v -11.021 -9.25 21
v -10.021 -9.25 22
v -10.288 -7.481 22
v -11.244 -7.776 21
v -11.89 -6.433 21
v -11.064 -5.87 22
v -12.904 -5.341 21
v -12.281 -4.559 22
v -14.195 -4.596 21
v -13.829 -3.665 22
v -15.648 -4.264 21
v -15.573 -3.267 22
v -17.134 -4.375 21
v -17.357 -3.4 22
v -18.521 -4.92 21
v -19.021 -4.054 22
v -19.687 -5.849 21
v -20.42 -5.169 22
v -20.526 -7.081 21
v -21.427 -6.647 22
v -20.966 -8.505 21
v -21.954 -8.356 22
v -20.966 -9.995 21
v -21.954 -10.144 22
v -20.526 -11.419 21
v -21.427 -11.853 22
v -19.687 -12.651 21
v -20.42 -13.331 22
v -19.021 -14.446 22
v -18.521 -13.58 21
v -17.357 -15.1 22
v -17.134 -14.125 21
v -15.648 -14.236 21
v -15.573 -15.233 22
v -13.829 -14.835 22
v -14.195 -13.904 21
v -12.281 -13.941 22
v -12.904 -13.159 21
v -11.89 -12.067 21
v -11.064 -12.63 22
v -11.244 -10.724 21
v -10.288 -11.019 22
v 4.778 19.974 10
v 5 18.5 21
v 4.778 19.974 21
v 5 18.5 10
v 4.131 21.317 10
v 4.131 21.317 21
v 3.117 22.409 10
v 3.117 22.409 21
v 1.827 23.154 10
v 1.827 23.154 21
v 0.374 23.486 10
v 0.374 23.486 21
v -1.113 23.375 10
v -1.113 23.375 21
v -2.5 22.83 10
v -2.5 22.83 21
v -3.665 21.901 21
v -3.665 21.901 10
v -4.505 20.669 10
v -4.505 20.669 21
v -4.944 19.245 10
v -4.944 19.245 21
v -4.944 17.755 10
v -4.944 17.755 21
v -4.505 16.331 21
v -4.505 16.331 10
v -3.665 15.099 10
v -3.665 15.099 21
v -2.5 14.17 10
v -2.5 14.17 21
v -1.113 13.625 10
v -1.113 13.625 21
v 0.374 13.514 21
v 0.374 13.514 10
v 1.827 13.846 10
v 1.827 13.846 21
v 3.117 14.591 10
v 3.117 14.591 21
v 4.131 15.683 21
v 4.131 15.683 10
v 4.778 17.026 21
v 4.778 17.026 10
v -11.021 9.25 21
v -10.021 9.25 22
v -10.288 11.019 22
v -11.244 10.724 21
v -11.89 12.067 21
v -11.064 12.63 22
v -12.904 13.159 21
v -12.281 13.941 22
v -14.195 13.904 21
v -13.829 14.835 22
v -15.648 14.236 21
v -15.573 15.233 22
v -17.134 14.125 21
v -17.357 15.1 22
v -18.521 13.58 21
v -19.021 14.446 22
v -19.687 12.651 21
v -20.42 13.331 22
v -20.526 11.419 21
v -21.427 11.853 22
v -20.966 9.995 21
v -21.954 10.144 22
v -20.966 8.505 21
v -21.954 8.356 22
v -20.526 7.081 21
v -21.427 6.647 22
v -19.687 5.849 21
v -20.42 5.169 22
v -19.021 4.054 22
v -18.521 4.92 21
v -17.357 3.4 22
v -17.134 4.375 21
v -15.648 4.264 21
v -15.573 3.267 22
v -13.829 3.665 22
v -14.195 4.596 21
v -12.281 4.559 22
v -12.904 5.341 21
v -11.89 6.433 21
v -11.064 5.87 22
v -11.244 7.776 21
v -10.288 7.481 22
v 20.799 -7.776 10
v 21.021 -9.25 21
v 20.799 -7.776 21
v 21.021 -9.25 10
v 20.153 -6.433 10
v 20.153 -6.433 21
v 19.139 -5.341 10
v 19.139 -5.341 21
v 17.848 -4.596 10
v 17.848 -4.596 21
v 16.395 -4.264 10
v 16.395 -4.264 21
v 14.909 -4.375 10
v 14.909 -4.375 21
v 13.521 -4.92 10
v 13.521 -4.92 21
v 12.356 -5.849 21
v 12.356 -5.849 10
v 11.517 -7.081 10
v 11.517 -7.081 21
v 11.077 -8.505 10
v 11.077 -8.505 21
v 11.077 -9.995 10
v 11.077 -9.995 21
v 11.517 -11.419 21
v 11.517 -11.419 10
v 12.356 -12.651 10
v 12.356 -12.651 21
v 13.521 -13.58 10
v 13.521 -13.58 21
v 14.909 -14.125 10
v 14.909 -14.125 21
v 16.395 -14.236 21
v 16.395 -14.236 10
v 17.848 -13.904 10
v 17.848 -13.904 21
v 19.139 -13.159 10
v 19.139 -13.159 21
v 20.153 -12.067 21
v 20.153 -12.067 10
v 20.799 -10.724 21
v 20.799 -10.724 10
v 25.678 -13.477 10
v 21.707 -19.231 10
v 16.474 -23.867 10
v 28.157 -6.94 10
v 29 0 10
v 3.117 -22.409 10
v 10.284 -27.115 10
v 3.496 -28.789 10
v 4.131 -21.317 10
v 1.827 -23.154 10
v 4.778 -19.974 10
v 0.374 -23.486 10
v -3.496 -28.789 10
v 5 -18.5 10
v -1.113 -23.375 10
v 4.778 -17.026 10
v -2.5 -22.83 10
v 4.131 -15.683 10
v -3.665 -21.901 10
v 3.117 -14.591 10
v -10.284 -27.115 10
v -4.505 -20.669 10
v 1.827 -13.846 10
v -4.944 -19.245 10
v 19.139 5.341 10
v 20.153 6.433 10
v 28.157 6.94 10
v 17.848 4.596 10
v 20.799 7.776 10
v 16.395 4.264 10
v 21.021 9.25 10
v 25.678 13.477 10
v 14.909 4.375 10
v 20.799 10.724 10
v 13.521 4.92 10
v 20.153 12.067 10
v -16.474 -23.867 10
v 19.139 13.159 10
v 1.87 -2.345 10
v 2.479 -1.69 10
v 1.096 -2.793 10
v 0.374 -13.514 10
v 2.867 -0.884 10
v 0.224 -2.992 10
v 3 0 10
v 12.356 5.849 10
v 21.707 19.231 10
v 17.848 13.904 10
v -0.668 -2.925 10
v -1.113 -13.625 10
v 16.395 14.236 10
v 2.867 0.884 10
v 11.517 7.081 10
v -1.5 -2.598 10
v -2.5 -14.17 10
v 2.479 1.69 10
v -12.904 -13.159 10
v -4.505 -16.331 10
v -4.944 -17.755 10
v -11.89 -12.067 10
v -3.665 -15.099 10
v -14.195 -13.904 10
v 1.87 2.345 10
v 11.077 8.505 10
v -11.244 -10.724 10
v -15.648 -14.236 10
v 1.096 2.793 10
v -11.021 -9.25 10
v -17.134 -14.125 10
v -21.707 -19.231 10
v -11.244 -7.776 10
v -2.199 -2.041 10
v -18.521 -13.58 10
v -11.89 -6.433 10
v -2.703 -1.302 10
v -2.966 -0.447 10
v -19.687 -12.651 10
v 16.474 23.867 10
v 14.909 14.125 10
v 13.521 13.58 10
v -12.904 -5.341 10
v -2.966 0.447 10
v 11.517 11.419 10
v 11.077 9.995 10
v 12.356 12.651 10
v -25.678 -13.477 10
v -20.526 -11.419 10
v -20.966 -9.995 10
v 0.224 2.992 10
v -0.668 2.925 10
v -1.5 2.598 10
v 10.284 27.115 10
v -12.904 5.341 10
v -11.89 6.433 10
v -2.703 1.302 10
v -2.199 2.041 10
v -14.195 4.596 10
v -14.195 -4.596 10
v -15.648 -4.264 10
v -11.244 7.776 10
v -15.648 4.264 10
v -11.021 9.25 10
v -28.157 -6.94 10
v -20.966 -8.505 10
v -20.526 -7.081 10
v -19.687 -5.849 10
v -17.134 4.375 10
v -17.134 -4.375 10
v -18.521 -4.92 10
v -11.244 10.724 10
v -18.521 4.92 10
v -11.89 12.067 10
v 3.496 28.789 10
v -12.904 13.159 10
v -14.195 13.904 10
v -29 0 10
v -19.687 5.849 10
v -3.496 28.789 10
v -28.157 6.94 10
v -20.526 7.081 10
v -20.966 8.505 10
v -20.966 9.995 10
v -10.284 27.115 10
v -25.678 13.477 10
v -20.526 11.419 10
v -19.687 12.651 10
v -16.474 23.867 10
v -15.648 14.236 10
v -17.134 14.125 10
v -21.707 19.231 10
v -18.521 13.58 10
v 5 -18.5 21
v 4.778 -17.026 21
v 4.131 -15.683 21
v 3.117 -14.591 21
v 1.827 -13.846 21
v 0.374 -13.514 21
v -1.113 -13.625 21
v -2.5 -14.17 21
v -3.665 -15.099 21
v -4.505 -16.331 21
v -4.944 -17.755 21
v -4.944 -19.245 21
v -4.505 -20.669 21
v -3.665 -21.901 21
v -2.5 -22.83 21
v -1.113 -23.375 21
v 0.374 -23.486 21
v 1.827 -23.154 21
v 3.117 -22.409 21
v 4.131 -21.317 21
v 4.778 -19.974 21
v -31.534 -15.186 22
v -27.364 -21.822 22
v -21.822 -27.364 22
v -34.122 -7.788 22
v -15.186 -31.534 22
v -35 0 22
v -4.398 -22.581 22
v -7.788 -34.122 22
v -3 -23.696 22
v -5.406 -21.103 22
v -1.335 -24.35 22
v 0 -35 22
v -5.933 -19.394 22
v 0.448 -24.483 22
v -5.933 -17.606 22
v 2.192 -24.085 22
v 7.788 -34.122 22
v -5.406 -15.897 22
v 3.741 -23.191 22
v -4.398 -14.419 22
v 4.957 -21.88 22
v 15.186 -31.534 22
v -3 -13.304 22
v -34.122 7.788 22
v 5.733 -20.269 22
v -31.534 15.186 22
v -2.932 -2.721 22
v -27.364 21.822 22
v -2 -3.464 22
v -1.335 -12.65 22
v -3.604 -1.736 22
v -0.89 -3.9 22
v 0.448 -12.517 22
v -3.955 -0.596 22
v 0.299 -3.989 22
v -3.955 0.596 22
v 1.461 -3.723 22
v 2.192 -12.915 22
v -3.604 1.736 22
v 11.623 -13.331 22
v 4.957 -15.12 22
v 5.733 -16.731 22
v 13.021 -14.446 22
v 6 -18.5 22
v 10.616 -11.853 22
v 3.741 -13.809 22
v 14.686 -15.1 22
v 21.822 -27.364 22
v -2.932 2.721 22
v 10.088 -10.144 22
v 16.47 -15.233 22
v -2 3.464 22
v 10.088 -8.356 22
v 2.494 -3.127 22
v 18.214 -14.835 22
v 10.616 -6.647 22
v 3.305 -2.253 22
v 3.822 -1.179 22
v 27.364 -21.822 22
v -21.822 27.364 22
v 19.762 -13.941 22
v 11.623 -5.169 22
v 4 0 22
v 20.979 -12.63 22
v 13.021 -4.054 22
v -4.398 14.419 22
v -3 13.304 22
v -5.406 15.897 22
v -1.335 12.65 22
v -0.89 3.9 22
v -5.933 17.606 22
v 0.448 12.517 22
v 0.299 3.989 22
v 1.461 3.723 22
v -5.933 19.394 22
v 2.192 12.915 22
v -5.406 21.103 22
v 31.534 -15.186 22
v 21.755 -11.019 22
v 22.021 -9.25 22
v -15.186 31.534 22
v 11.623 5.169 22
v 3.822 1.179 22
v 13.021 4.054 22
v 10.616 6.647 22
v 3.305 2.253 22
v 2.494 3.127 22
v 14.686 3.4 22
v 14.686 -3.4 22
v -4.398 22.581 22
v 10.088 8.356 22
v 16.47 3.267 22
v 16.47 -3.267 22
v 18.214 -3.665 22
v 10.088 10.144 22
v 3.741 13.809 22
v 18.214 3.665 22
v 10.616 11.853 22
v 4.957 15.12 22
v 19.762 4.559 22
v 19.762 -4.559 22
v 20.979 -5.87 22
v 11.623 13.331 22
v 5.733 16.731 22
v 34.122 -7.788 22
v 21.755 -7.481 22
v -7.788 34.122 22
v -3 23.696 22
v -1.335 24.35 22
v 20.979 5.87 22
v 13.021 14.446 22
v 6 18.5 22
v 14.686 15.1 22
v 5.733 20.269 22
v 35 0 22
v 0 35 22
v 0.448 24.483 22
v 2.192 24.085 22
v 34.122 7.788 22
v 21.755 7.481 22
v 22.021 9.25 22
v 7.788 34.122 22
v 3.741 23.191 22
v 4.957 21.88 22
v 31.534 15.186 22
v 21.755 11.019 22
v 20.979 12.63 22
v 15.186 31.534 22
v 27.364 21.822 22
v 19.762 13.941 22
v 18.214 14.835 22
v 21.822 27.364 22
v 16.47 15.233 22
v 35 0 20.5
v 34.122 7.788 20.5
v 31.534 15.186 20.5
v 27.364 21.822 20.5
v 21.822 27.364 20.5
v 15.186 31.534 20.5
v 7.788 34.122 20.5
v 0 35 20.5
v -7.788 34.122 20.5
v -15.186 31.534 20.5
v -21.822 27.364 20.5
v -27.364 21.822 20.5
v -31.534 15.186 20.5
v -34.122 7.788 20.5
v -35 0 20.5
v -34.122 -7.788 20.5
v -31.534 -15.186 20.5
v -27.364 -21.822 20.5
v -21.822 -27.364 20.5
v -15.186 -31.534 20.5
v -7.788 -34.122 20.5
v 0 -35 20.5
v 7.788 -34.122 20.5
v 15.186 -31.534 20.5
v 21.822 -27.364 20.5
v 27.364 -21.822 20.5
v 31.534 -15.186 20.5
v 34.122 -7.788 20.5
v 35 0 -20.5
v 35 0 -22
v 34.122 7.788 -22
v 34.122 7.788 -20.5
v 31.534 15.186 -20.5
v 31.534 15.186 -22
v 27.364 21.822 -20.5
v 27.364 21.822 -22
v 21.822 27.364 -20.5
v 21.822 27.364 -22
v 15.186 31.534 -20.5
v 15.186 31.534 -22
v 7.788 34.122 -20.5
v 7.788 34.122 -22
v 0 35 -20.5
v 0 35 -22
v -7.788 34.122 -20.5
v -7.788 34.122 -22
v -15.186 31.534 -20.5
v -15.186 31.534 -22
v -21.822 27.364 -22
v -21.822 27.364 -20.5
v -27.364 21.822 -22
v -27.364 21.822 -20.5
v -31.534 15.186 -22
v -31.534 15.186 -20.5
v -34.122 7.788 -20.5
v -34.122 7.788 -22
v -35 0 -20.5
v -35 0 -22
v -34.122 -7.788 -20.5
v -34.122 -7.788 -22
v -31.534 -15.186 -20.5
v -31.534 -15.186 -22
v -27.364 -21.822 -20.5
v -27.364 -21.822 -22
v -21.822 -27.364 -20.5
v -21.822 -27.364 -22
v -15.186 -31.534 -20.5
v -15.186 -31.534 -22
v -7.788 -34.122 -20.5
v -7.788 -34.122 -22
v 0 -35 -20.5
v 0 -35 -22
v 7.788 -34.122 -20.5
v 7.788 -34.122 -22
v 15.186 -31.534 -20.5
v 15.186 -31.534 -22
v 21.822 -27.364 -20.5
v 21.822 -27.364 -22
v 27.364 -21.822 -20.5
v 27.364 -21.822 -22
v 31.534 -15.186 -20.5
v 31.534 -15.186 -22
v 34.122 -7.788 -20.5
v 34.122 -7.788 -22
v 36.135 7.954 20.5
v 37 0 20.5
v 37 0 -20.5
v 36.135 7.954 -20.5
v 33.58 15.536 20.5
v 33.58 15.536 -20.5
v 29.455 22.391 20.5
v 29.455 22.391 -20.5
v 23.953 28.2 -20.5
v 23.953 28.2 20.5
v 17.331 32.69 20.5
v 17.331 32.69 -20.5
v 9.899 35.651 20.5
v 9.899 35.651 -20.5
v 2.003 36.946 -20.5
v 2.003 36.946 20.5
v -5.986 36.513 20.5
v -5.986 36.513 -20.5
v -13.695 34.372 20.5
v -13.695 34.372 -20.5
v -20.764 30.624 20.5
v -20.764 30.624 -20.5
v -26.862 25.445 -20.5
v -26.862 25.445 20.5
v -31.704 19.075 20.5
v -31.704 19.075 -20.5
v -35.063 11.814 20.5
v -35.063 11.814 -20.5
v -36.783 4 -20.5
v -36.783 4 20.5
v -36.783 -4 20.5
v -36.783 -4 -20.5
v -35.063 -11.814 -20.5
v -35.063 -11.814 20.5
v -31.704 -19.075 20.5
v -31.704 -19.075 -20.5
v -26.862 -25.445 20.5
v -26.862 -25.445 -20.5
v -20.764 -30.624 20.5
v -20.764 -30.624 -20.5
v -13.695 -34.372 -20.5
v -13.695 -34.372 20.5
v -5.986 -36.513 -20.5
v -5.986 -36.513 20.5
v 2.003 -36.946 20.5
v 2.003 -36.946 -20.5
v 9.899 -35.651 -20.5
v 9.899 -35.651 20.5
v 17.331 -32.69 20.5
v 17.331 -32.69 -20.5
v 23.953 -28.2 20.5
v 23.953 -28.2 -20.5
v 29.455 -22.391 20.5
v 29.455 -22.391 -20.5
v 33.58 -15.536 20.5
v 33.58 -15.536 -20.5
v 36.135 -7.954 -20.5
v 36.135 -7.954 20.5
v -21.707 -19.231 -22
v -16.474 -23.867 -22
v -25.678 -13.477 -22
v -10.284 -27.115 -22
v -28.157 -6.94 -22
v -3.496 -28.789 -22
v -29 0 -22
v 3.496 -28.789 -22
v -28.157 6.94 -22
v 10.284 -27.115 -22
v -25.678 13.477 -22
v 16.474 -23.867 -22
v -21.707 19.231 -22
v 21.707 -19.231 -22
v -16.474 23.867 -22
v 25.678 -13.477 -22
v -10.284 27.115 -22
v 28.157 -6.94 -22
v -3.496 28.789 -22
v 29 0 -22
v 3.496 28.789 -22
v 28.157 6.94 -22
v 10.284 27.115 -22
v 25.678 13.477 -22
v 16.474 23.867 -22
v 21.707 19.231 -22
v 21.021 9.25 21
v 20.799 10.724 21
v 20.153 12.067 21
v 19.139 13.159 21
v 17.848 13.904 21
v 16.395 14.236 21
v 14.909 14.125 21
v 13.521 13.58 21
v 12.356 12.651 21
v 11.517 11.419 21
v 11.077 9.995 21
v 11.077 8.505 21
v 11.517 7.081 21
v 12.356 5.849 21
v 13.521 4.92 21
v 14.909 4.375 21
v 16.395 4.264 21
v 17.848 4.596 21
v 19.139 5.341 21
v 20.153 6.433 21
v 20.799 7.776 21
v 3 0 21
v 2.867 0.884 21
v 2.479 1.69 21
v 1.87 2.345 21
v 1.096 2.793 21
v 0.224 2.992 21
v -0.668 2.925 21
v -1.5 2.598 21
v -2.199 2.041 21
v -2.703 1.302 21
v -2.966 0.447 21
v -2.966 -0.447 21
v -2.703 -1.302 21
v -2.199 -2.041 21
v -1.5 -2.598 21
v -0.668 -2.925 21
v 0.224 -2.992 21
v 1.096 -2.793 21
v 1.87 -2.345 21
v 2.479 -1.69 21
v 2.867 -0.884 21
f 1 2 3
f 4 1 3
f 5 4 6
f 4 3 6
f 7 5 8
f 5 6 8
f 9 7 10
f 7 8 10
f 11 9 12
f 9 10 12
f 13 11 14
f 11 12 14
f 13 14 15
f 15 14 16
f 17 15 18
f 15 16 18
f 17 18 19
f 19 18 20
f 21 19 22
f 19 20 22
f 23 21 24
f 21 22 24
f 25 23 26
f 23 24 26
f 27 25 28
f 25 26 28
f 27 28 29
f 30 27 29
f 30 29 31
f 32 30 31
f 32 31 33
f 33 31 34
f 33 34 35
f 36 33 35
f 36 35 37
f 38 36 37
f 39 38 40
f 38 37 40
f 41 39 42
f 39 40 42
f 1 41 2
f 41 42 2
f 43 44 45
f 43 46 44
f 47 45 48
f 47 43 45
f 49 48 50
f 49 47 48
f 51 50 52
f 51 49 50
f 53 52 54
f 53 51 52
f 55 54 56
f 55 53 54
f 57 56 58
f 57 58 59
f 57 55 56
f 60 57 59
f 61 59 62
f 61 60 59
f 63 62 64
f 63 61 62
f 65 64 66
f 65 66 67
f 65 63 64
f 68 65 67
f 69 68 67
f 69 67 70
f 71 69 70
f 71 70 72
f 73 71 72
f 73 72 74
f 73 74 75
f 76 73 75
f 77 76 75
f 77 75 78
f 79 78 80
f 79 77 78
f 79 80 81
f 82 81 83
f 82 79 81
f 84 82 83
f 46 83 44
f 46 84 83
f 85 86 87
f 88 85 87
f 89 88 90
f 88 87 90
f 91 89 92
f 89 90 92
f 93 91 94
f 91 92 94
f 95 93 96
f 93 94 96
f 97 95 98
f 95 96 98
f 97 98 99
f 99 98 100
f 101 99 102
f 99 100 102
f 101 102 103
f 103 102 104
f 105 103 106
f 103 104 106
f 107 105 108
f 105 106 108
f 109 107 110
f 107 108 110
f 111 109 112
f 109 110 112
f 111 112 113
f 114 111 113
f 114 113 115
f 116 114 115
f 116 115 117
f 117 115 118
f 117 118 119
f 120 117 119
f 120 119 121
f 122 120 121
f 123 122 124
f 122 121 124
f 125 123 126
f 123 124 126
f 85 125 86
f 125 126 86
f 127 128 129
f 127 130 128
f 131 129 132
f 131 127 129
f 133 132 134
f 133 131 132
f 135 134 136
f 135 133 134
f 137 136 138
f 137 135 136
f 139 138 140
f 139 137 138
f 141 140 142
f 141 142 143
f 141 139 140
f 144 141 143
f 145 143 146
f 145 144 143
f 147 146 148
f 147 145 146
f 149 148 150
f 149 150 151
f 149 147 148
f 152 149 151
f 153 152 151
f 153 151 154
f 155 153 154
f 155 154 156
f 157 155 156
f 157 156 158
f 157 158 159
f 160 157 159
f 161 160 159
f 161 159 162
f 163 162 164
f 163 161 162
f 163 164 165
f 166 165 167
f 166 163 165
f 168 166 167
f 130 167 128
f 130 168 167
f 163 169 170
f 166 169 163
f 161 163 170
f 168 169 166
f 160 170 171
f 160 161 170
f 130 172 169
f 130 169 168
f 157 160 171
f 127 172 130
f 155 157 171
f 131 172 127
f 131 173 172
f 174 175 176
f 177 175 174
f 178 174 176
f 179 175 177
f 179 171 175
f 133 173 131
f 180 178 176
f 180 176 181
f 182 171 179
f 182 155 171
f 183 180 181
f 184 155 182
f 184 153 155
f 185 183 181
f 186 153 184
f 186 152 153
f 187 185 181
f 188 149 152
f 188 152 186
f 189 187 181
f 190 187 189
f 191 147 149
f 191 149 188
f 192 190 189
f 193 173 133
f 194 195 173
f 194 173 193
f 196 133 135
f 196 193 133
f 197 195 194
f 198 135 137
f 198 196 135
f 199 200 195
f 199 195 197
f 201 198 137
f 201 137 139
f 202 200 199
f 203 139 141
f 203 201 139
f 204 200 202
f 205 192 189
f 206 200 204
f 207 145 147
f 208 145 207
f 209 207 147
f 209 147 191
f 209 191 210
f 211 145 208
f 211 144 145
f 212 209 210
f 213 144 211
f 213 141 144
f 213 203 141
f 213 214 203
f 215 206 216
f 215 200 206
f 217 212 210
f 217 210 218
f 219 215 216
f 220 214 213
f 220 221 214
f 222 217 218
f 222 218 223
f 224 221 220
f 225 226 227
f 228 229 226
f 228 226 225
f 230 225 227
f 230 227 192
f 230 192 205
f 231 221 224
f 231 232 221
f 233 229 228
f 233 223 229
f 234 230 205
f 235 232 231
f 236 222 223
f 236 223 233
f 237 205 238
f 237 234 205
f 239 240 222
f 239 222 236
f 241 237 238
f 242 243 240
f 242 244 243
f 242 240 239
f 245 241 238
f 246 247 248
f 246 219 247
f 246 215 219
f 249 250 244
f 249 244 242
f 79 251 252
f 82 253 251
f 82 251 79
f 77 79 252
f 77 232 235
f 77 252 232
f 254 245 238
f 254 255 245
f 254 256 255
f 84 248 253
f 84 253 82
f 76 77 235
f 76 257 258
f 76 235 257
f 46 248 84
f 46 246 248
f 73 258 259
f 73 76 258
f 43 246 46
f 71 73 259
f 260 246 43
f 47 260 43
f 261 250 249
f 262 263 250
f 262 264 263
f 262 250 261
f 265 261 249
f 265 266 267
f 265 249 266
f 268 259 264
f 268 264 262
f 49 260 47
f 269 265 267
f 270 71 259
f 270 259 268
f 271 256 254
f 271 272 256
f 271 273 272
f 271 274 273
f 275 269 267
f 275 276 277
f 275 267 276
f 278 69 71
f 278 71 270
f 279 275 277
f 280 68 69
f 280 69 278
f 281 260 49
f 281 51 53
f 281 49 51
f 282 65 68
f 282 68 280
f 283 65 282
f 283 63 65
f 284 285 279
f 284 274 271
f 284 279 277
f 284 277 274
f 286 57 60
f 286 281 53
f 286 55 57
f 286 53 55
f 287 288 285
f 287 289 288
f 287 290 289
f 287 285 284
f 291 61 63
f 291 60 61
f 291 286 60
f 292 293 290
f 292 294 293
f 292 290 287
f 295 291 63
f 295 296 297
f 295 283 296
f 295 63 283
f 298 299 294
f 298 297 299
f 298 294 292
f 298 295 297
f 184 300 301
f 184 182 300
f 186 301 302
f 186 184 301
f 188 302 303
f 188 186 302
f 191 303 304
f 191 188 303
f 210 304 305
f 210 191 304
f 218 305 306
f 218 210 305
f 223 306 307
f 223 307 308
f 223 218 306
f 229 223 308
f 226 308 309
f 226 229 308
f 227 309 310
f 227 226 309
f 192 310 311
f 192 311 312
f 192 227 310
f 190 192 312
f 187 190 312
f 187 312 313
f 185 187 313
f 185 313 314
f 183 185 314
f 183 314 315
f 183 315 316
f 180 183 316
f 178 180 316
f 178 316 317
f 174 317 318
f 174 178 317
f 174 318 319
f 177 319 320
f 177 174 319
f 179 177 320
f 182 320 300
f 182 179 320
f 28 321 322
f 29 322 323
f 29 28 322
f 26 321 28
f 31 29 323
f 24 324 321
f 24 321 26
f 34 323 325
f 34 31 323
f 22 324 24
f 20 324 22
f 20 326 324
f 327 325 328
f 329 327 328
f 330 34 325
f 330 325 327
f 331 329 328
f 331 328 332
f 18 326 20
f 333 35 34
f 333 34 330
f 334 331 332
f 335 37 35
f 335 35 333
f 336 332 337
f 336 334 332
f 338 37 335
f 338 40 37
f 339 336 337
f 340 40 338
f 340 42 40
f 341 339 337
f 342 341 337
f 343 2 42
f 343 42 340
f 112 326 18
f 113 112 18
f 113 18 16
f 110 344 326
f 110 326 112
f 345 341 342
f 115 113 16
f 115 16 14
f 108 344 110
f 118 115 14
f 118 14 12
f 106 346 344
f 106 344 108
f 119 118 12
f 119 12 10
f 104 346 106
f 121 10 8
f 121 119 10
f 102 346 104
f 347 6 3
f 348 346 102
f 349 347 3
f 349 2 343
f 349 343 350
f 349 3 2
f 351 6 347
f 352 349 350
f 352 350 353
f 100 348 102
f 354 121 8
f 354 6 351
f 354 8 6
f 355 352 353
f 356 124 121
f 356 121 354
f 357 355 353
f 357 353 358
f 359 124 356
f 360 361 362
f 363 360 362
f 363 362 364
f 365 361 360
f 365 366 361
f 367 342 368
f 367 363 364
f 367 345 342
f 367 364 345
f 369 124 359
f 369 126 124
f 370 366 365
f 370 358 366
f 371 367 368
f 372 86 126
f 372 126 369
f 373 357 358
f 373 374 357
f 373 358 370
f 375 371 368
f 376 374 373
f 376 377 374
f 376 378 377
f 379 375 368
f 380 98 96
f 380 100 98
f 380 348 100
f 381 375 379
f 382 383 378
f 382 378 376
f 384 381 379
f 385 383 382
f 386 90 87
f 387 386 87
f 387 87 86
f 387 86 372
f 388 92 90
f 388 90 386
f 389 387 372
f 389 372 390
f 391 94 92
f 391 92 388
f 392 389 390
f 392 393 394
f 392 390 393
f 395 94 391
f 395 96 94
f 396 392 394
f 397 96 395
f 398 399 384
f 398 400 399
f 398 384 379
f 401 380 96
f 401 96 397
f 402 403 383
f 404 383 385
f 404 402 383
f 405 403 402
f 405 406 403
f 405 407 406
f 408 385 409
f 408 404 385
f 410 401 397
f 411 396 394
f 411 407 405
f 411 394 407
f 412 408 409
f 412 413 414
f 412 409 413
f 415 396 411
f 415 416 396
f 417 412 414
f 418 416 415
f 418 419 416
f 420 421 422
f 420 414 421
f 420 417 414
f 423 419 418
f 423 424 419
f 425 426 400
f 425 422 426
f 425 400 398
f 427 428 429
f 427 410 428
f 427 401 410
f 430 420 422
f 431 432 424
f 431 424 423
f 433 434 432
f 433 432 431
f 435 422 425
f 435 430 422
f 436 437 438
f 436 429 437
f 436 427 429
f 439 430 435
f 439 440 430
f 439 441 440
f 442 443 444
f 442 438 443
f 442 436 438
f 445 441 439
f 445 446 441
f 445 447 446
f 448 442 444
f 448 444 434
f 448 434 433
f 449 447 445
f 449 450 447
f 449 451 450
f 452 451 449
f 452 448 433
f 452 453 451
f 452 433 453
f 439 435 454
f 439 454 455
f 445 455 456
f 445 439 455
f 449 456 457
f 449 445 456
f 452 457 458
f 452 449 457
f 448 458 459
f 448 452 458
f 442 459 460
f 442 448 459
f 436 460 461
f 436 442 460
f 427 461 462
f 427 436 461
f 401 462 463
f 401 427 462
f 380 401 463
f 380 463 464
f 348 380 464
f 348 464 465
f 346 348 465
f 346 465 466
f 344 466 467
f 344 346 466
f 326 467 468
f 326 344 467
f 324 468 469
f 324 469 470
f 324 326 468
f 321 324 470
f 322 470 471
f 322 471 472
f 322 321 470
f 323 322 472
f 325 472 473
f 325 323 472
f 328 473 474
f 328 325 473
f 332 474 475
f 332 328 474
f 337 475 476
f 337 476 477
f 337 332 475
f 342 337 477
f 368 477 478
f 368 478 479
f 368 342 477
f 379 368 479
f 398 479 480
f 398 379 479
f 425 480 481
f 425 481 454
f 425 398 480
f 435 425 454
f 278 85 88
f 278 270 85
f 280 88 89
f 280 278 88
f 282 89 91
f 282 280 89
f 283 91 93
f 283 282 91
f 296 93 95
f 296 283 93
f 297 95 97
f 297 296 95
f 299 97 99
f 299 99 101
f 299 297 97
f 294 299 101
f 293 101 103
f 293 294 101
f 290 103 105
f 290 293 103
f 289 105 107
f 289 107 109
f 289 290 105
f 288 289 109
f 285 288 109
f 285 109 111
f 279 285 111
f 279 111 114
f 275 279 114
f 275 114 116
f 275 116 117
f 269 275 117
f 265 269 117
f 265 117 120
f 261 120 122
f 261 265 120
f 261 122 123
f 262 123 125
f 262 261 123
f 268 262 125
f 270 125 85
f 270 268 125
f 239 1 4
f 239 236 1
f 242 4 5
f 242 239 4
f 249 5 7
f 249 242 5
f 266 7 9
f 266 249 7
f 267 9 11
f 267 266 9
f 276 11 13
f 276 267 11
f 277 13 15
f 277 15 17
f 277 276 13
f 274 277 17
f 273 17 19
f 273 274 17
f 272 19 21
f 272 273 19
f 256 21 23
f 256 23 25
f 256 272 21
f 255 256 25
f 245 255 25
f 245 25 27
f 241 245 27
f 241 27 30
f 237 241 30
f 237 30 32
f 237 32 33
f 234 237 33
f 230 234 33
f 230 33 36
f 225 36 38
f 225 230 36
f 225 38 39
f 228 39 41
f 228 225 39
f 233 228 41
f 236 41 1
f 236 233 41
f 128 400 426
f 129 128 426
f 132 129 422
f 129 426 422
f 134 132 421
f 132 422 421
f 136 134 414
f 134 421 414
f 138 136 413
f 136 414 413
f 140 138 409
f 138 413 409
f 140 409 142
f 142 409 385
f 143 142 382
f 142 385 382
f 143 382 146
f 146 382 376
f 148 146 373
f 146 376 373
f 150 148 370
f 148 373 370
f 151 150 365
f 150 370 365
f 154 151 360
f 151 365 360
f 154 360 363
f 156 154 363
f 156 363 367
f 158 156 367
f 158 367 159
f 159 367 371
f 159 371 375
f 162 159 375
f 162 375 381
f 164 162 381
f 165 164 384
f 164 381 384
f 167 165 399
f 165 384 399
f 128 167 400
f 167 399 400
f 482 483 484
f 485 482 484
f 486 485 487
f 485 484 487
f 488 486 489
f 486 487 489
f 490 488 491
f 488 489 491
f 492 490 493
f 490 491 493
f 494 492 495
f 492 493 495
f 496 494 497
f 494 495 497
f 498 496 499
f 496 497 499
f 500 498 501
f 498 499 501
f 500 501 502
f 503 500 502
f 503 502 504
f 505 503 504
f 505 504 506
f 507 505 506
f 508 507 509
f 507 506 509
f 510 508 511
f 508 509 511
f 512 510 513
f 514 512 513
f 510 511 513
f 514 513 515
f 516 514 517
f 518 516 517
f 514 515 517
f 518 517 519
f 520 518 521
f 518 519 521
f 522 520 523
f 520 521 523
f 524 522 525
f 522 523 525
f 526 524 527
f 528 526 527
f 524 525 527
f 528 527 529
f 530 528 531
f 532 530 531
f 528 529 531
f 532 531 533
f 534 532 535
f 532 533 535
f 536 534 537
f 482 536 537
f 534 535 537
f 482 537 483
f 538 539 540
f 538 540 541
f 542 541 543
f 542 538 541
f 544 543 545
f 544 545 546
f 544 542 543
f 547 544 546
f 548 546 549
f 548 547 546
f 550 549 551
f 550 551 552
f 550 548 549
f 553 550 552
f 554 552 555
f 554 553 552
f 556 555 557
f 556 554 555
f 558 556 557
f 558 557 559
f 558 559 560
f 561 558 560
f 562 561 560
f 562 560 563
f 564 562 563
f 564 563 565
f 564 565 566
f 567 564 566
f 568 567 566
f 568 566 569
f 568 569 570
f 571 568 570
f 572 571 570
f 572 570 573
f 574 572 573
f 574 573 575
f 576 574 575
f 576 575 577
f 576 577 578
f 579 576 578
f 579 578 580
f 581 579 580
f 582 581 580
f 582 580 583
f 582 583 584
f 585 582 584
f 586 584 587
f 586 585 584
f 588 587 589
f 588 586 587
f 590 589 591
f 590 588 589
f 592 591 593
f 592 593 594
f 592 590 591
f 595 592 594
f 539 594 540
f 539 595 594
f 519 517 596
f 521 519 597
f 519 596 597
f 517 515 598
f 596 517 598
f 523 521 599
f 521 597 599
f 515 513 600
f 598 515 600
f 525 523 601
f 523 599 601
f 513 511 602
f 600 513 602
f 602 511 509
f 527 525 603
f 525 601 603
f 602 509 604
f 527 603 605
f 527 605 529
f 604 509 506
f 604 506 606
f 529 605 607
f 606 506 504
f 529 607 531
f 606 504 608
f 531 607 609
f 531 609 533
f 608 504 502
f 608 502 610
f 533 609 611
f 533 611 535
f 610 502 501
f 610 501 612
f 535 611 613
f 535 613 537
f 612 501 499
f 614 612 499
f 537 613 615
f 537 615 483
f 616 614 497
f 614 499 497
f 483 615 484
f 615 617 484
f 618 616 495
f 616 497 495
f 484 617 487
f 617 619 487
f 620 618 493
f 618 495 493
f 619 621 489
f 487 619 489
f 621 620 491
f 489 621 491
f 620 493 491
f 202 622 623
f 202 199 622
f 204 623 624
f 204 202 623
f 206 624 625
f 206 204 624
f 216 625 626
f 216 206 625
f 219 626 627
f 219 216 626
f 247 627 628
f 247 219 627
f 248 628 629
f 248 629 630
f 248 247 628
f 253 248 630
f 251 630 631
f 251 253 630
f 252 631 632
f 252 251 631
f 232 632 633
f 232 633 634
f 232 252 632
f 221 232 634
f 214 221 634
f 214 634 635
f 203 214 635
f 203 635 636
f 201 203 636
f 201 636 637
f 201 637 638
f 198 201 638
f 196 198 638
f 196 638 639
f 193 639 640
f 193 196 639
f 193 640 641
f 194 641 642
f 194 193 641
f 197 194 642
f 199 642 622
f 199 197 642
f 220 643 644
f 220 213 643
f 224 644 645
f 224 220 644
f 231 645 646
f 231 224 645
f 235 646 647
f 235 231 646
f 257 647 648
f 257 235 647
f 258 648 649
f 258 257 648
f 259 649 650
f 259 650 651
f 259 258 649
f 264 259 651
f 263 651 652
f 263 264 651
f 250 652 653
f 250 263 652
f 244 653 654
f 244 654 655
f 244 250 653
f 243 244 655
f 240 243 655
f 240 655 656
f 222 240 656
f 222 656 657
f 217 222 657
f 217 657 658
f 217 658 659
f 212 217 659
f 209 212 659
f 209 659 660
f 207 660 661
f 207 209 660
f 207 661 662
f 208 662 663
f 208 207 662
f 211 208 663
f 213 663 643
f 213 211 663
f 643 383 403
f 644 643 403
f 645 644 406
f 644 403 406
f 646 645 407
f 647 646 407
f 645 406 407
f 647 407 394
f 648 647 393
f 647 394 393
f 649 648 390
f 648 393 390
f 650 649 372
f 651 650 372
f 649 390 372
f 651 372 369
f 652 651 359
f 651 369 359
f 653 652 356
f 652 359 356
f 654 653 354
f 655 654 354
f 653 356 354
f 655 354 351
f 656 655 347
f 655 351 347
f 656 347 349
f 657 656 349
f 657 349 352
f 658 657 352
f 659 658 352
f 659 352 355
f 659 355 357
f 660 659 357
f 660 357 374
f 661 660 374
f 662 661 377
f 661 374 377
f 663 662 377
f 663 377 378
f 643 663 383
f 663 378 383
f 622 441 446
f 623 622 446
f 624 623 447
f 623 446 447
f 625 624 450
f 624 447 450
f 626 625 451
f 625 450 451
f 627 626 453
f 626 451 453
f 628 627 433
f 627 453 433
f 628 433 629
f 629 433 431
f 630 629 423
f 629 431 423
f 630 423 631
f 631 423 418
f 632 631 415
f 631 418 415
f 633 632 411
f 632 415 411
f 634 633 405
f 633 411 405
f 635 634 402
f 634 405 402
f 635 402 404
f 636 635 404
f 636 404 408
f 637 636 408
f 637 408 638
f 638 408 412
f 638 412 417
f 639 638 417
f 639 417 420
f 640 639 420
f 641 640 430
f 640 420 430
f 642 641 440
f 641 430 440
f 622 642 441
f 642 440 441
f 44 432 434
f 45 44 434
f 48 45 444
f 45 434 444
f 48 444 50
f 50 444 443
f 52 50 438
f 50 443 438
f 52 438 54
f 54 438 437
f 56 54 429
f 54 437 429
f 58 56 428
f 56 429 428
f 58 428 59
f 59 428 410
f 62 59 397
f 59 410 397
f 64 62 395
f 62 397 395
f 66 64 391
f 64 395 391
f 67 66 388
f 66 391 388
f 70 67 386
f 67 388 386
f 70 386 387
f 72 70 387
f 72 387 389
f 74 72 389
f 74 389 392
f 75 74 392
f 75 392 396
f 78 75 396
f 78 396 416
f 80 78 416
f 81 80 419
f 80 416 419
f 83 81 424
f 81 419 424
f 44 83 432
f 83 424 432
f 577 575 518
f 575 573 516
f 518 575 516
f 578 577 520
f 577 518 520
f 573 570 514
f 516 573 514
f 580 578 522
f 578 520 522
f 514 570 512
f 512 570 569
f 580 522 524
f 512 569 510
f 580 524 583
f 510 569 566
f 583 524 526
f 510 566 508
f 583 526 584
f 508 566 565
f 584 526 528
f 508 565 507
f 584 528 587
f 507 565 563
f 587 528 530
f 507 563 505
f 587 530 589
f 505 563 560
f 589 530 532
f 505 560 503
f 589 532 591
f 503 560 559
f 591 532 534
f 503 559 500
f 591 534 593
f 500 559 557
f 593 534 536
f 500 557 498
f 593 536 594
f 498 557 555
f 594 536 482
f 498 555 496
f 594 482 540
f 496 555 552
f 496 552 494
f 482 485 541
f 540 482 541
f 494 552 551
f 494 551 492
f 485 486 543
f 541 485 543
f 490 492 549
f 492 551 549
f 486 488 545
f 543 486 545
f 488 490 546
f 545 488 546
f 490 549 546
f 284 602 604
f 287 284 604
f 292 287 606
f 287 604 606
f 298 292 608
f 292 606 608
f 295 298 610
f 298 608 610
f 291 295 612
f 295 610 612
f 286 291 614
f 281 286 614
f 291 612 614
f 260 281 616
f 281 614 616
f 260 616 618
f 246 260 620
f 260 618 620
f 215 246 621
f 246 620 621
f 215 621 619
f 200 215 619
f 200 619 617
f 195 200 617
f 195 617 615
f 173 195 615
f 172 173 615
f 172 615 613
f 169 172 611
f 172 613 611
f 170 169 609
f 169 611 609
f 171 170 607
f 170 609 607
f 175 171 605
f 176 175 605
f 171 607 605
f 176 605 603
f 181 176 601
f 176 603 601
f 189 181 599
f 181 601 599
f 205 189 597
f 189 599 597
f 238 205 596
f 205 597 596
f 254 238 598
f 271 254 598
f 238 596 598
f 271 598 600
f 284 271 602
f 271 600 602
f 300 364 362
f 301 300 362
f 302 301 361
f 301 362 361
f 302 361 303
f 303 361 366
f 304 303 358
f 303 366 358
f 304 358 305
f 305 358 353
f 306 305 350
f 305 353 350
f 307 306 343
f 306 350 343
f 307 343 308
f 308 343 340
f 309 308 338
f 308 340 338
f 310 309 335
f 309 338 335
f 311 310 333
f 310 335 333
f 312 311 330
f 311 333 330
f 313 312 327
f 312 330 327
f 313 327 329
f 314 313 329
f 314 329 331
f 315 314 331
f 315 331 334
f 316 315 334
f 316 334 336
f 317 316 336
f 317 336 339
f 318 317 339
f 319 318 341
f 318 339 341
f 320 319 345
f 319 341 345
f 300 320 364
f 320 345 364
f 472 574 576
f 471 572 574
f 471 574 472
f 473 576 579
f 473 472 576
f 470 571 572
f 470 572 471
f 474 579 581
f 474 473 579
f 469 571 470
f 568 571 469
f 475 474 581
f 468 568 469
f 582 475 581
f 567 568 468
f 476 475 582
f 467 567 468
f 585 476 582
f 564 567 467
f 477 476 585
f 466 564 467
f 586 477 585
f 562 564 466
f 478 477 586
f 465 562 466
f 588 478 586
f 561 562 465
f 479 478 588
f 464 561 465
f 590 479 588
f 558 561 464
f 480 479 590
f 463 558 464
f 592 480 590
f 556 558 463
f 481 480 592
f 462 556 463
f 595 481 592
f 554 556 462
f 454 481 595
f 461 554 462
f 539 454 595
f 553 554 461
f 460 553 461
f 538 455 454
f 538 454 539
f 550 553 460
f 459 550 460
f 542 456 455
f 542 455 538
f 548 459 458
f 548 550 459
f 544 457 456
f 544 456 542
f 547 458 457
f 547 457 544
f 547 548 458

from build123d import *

# Parameters (mm, degrees)
ESQUISSE1_R             = 34
ESQUISSE1_R_2           = 3
ESQUISSE1_R_3           = 5
BOSS_EXTRU_1_DEPTH      = 22
ESQUISSE2_R             = 37
ESQUISSE2_R_2           = 34
BOSS_EXTRU_2_DEPTH      = 44
ESQUISSE2_3_R           = 37
ESQUISSE2_3_R_2         = 34
ENL_V_MAT_EXTRU_1_DEPTH = 1.5
ESQUISSE3_R             = 35
ESQUISSE3_R_2           = 34
BOSS_EXTRU_3_DEPTH      = 1.5
CHANFREIN1_SIZE         = 1
ESQUISSE4_R             = 29
ENL_V_MAT_EXTRU_2_DEPTH = 32


with BuildPart() as part:
    # Esquisse1 → Boss.-Extru.1 (new body, symmetric)
    with BuildSketch(Plane.XY):
        Circle(ESQUISSE1_R)
        Circle(ESQUISSE1_R_2, mode=Mode.SUBTRACT)
        with Locations((0, 18.5)):
            Circle(ESQUISSE1_R_3, mode=Mode.SUBTRACT)
        with Locations((16.02146997, 9.25)):
            Circle(ESQUISSE1_R_3, mode=Mode.SUBTRACT)
        with Locations((16.02146997, -9.25)):
            Circle(ESQUISSE1_R_3, mode=Mode.SUBTRACT)
        with Locations((0, -18.5)):
            Circle(ESQUISSE1_R_3, mode=Mode.SUBTRACT)
        with Locations((-16.02146997, -9.25)):
            Circle(ESQUISSE1_R_3, mode=Mode.SUBTRACT)
        with Locations((-16.02146997, 9.25)):
            Circle(ESQUISSE1_R_3, mode=Mode.SUBTRACT)
    extrude(amount=BOSS_EXTRU_1_DEPTH, both=True)

    # Esquisse2 → Boss.-Extru.2 (add)
    with BuildSketch(Plane.XY.offset(22)):
        Circle(ESQUISSE2_R)
        Circle(ESQUISSE2_R_2, mode=Mode.SUBTRACT)
    extrude(amount=-BOSS_EXTRU_2_DEPTH)

    # Esquisse2_3 → Enl_v. mat.-Extru.1 (cut)
    with BuildSketch(Plane.XY.offset(22)):
        Circle(ESQUISSE2_3_R)
        Circle(ESQUISSE2_3_R_2, mode=Mode.SUBTRACT)
    enl_v_mat_extru_1 = extrude(amount=-ENL_V_MAT_EXTRU_1_DEPTH, mode=Mode.SUBTRACT)

    # Sym_trie1: Enl_v. mat.-Extru.1 across plane
    add(enl_v_mat_extru_1.mirror(Plane.XY), mode=Mode.SUBTRACT)

    # Esquisse3 → Boss.-Extru.3 (add)
    with BuildSketch(Plane.XY.offset(22)):
        Circle(ESQUISSE3_R)
        Circle(ESQUISSE3_R_2, mode=Mode.SUBTRACT)
    boss_extru_3 = extrude(amount=-BOSS_EXTRU_3_DEPTH)

    # Sym_trie2: Boss.-Extru.3 across plane
    add(boss_extru_3.mirror(Plane.XY))

    # Chanfrein1
    chanfrein1_edges = [part.edges().sort_by_distance(p)[0] for p in [
        (11.02146997, 9.25, -22),
        (11.02146997, 9.25, 22),
        (11.02146997, -9.25, -22),
        (11.02146997, -9.25, 22),
        (-5, -18.5, -22),
        (-5, -18.5, 22),
        (-21.02146997, -9.25, -22),
        (-21.02146997, -9.25, 22),
        (-21.02146997, 9.25, -22),
        (-21.02146997, 9.25, 22),
        (-3, 0, -22),
        (-3, 0, 22),
        (-5, 18.5, -22),
        (-5, 18.5, 22),
    ]]
    chamfer(chanfrein1_edges, length=CHANFREIN1_SIZE)

    # Esquisse4 → Enl_v. mat.-Extru.2 (cut)
    with BuildSketch(Plane(origin=(0, 0, -22), x_dir=(-1, 0, 0), z_dir=(0, 0, -1))):
        Circle(ESQUISSE4_R)
    extrude(amount=-ENL_V_MAT_EXTRU_2_DEPTH, mode=Mode.SUBTRACT)


solid = part.part
